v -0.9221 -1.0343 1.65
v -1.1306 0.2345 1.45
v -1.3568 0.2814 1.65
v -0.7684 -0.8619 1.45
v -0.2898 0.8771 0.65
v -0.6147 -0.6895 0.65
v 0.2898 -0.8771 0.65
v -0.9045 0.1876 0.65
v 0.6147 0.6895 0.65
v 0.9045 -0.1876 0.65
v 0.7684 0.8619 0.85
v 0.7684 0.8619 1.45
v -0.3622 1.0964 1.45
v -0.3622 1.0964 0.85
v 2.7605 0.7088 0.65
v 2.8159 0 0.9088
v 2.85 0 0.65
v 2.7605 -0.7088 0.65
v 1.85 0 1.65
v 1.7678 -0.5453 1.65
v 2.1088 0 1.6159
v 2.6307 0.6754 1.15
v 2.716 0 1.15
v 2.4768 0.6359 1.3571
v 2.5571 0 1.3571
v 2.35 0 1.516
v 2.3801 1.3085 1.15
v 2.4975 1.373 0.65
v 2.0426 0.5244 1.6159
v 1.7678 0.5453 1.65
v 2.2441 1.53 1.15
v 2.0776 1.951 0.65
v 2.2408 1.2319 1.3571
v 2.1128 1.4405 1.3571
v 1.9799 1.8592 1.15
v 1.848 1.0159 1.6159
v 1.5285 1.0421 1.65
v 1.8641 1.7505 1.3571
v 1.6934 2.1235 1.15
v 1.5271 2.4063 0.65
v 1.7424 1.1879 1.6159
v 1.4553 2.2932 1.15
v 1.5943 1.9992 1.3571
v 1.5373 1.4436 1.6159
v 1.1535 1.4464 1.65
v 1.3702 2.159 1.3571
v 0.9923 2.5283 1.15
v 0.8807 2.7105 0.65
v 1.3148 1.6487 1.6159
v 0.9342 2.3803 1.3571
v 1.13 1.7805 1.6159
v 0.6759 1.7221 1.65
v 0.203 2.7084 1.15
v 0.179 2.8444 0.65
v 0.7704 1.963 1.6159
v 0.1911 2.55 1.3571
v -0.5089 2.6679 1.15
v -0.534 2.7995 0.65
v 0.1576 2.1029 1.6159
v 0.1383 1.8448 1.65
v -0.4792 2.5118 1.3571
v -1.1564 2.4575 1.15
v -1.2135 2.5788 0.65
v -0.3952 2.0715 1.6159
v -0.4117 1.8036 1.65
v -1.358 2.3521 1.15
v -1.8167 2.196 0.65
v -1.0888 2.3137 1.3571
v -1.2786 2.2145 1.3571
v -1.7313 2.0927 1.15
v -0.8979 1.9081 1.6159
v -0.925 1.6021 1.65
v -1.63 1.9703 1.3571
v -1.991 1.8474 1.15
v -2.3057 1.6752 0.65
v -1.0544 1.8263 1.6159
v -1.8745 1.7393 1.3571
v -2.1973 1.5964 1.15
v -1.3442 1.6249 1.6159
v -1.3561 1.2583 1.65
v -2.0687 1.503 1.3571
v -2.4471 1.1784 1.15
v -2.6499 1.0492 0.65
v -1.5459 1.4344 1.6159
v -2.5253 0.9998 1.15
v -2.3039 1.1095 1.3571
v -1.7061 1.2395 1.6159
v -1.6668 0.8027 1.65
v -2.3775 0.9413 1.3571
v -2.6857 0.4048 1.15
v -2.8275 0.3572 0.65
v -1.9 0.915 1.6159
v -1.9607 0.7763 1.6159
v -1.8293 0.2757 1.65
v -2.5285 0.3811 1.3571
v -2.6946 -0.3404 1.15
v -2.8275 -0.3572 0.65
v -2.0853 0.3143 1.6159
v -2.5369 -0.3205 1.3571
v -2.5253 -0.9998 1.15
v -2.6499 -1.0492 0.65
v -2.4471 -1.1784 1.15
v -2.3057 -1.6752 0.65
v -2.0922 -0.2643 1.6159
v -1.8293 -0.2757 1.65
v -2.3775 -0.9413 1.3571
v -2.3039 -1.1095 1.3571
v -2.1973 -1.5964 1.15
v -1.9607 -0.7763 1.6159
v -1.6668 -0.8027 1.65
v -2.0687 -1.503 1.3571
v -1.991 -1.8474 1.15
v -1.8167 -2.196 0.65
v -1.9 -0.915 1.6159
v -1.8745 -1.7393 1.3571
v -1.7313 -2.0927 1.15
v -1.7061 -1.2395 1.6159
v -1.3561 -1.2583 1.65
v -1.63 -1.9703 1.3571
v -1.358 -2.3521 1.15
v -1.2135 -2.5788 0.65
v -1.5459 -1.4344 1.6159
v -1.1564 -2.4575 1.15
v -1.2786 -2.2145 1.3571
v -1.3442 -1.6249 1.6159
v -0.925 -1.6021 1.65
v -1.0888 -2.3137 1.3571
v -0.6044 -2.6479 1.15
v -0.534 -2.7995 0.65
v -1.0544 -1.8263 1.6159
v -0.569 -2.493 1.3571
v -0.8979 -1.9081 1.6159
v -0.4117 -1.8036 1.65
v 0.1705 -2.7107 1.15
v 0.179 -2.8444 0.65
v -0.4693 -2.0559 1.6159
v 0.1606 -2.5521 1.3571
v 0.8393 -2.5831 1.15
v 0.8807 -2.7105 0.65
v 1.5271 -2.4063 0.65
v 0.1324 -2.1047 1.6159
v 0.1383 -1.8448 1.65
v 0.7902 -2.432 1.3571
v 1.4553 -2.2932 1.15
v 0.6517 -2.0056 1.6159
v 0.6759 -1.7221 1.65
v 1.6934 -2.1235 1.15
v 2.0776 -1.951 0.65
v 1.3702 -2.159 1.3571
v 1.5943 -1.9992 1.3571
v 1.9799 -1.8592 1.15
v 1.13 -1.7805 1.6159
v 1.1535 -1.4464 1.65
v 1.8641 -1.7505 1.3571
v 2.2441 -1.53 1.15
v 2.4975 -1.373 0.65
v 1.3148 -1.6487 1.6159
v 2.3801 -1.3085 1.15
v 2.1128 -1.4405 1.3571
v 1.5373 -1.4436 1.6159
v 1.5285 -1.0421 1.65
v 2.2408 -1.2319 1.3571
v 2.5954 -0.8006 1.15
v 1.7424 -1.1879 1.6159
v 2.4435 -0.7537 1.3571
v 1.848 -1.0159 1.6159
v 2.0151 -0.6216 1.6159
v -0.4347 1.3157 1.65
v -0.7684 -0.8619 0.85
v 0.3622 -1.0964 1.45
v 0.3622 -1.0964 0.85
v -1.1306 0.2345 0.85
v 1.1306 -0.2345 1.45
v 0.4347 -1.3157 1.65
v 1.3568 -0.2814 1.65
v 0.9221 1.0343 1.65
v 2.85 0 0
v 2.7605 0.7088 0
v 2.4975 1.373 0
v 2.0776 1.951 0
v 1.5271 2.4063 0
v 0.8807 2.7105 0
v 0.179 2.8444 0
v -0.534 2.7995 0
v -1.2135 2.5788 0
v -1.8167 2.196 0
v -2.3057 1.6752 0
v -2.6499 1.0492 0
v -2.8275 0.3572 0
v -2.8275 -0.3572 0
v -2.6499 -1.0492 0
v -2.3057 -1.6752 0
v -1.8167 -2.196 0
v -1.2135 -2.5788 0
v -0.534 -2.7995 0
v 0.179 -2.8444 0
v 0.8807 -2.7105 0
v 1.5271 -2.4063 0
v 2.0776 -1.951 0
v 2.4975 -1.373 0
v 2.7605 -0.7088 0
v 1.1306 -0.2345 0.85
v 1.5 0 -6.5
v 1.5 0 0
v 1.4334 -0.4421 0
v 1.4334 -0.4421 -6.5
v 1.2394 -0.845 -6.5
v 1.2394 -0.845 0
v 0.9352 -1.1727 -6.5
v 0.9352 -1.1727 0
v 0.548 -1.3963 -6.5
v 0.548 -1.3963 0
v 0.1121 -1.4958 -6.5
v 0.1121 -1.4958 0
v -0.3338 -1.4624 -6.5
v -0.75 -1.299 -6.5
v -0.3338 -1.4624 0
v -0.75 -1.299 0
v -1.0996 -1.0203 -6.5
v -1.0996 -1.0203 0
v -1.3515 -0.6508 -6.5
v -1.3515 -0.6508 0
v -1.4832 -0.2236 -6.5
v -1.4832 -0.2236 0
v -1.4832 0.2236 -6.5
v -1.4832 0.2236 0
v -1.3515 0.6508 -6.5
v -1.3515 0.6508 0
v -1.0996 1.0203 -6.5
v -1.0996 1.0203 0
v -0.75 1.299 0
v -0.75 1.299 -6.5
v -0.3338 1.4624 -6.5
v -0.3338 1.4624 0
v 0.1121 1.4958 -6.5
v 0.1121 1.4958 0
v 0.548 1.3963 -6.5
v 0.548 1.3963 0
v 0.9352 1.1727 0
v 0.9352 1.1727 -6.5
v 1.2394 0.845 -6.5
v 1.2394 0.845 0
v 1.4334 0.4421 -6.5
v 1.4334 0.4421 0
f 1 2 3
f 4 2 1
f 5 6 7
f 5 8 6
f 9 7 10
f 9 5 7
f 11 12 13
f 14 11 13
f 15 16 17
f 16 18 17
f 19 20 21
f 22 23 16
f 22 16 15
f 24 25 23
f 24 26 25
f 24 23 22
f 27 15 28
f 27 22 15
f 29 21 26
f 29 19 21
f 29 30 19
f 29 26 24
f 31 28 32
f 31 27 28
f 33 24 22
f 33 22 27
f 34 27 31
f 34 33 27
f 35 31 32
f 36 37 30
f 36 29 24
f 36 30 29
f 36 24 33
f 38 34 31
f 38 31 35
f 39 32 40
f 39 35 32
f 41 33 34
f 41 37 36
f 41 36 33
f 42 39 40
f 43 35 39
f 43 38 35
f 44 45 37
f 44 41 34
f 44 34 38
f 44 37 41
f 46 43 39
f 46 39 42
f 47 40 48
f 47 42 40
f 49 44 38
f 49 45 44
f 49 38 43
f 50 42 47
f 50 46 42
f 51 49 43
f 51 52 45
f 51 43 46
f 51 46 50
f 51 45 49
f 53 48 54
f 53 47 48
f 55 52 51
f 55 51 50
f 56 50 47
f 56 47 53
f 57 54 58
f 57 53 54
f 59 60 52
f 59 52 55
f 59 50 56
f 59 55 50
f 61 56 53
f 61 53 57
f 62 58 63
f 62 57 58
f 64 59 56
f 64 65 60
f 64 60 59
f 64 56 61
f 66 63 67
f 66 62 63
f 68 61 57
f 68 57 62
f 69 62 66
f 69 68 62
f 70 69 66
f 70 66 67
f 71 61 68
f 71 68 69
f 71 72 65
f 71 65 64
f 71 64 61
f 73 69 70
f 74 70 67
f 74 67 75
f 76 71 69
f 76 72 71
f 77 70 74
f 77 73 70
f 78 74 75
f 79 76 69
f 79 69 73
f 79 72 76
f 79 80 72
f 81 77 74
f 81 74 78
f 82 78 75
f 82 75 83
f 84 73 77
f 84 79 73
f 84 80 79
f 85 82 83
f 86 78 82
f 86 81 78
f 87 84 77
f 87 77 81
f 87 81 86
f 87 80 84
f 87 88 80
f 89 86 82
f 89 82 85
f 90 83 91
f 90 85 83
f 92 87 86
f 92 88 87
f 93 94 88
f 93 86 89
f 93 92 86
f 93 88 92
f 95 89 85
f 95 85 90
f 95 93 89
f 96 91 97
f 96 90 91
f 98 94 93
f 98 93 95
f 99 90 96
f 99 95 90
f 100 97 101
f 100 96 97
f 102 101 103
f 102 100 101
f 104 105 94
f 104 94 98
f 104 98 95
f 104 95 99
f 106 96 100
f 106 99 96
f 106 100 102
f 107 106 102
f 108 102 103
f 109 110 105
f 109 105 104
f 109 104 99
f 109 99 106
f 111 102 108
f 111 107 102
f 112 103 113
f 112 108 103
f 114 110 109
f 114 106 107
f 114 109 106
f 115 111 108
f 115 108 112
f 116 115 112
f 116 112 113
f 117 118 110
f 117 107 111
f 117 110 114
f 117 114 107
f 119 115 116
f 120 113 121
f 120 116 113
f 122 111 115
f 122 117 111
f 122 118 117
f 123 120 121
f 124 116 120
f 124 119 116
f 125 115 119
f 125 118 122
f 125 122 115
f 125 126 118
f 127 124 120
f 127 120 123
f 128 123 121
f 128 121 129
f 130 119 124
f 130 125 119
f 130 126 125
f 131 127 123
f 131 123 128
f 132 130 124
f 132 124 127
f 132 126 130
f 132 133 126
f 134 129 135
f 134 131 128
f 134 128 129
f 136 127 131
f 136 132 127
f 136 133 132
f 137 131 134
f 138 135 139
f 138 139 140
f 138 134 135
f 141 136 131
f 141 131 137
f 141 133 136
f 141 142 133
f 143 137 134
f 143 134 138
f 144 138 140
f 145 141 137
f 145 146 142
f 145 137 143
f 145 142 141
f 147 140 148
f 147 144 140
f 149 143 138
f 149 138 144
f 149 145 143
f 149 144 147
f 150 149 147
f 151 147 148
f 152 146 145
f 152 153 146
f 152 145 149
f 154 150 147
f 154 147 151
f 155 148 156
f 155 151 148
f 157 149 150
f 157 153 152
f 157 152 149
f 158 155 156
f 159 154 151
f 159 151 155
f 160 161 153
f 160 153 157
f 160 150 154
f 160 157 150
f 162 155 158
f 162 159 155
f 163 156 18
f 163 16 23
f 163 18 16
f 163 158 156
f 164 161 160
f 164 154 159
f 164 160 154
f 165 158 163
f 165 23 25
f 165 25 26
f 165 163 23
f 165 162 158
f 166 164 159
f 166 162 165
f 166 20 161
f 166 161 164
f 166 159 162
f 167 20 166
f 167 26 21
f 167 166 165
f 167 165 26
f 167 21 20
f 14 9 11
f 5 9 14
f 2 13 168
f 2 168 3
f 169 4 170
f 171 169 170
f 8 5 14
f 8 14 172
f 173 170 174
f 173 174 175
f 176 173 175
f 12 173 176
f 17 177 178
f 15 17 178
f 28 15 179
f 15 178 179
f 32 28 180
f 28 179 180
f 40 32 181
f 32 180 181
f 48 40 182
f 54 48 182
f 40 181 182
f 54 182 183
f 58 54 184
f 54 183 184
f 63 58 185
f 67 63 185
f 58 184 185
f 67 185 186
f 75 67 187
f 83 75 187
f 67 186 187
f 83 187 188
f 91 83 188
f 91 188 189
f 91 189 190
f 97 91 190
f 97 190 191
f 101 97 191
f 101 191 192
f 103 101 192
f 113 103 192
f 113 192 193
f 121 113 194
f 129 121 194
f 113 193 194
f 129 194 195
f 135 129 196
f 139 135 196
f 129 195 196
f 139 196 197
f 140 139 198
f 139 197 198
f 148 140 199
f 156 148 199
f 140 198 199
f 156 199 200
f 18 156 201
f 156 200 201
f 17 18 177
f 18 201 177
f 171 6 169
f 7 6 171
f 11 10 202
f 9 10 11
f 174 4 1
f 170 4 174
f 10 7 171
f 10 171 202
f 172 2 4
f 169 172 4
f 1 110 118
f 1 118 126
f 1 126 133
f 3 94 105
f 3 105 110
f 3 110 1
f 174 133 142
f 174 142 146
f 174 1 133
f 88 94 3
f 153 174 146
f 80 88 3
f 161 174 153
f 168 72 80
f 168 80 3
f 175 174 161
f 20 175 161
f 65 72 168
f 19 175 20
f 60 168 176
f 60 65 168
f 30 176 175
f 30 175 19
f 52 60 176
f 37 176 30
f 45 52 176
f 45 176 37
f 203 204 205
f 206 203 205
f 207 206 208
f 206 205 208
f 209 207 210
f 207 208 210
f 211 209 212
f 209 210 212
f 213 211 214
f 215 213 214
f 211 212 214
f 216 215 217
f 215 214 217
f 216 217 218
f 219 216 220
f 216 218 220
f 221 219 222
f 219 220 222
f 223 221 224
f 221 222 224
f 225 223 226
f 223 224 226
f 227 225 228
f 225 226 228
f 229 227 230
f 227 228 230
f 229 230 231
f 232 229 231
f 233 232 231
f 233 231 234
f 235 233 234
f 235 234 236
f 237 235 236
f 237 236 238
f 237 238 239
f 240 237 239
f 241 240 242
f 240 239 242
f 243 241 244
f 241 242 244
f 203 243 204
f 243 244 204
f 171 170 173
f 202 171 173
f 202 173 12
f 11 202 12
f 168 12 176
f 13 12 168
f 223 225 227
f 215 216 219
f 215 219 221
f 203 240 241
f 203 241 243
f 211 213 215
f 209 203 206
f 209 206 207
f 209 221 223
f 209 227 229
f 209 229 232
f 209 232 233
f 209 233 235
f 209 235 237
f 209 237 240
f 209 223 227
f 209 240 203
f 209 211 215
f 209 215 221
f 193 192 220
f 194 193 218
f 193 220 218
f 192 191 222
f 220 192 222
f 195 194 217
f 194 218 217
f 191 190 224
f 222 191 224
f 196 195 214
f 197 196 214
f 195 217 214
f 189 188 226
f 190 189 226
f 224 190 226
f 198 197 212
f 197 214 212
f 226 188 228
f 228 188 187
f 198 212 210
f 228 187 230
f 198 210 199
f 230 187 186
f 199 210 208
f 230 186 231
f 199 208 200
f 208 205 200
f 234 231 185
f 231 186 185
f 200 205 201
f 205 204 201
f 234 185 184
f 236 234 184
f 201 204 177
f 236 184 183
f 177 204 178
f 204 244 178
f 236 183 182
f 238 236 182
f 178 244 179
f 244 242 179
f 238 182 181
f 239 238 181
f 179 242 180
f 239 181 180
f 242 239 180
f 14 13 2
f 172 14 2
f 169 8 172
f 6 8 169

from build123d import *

# Parameters (mm, degrees)
SKETCH_1_R          = 2.85
EXTRUDE_1_DEPTH     = 1.65
SKETCH_2_R          = 1.5
EXTRUDE_2_DEPTH     = 6.5
FILLET_1_R          = 1
CUT_EXTRUDE_1_DEPTH = 1
CHAMFER_1_SIZE      = 0.2


with BuildPart() as part:
    # 草图1 → 凸台-拉伸1 (new body)
    with BuildSketch(Plane.XY):
        Circle(SKETCH_1_R)
    extrude(amount=EXTRUDE_1_DEPTH)

    # 草图2 → 凸台-拉伸2 (add)
    with BuildSketch(Plane(origin=(0, 0, 0), x_dir=(-1, 0, 0), z_dir=(0, 0, -1))):
        with Locations(Location((0, 0, 0), (0, 0, 180))):
            Circle(SKETCH_2_R)
    extrude(amount=EXTRUDE_2_DEPTH)

    # 圆角1
    fillet_1_edges = [part.edges().sort_by_distance(p)[0] for p in [
        (-2.85, 0, 1.65),
    ]]
    fillet(fillet_1_edges, radius=FILLET_1_R)

    # 草图3 → 切除-拉伸1 (cut)
    with BuildSketch(Plane.XY.offset(1.65)):
        Polygon((0.362222341, -1.09641612), (1.130635384, -0.234514311), (0.768413043, 0.861901809), (-0.362222341, 1.09641612), (-1.130635384, 0.234514311), (-0.768413043, -0.861901809), align=None)
    extrude(amount=-CUT_EXTRUDE_1_DEPTH, mode=Mode.SUBTRACT)

    # 倒角1
    chamfer_1_edges = [part.edges().sort_by_distance(p)[0] for p in [
        (-0.203095351, -0.979158965, 0.65),
        (-0.949524213, -0.313693749, 0.65),
        (-0.746428862, 0.665465216, 0.65),
        (0.203095351, 0.979158965, 0.65),
        (0.949524213, 0.313693749, 0.65),
        (0.746428862, -0.665465216, 0.65),
        (-0.203095351, -0.979158965, 1.65),
        (0.746428862, -0.665465216, 1.65),
        (0.949524213, 0.313693749, 1.65),
        (0.203095351, 0.979158965, 1.65),
        (-0.746428862, 0.665465216, 1.65),
        (-0.949524213, -0.313693749, 1.65),
    ]]
    chamfer(chamfer_1_edges, length=CHAMFER_1_SIZE)


solid = part.part
